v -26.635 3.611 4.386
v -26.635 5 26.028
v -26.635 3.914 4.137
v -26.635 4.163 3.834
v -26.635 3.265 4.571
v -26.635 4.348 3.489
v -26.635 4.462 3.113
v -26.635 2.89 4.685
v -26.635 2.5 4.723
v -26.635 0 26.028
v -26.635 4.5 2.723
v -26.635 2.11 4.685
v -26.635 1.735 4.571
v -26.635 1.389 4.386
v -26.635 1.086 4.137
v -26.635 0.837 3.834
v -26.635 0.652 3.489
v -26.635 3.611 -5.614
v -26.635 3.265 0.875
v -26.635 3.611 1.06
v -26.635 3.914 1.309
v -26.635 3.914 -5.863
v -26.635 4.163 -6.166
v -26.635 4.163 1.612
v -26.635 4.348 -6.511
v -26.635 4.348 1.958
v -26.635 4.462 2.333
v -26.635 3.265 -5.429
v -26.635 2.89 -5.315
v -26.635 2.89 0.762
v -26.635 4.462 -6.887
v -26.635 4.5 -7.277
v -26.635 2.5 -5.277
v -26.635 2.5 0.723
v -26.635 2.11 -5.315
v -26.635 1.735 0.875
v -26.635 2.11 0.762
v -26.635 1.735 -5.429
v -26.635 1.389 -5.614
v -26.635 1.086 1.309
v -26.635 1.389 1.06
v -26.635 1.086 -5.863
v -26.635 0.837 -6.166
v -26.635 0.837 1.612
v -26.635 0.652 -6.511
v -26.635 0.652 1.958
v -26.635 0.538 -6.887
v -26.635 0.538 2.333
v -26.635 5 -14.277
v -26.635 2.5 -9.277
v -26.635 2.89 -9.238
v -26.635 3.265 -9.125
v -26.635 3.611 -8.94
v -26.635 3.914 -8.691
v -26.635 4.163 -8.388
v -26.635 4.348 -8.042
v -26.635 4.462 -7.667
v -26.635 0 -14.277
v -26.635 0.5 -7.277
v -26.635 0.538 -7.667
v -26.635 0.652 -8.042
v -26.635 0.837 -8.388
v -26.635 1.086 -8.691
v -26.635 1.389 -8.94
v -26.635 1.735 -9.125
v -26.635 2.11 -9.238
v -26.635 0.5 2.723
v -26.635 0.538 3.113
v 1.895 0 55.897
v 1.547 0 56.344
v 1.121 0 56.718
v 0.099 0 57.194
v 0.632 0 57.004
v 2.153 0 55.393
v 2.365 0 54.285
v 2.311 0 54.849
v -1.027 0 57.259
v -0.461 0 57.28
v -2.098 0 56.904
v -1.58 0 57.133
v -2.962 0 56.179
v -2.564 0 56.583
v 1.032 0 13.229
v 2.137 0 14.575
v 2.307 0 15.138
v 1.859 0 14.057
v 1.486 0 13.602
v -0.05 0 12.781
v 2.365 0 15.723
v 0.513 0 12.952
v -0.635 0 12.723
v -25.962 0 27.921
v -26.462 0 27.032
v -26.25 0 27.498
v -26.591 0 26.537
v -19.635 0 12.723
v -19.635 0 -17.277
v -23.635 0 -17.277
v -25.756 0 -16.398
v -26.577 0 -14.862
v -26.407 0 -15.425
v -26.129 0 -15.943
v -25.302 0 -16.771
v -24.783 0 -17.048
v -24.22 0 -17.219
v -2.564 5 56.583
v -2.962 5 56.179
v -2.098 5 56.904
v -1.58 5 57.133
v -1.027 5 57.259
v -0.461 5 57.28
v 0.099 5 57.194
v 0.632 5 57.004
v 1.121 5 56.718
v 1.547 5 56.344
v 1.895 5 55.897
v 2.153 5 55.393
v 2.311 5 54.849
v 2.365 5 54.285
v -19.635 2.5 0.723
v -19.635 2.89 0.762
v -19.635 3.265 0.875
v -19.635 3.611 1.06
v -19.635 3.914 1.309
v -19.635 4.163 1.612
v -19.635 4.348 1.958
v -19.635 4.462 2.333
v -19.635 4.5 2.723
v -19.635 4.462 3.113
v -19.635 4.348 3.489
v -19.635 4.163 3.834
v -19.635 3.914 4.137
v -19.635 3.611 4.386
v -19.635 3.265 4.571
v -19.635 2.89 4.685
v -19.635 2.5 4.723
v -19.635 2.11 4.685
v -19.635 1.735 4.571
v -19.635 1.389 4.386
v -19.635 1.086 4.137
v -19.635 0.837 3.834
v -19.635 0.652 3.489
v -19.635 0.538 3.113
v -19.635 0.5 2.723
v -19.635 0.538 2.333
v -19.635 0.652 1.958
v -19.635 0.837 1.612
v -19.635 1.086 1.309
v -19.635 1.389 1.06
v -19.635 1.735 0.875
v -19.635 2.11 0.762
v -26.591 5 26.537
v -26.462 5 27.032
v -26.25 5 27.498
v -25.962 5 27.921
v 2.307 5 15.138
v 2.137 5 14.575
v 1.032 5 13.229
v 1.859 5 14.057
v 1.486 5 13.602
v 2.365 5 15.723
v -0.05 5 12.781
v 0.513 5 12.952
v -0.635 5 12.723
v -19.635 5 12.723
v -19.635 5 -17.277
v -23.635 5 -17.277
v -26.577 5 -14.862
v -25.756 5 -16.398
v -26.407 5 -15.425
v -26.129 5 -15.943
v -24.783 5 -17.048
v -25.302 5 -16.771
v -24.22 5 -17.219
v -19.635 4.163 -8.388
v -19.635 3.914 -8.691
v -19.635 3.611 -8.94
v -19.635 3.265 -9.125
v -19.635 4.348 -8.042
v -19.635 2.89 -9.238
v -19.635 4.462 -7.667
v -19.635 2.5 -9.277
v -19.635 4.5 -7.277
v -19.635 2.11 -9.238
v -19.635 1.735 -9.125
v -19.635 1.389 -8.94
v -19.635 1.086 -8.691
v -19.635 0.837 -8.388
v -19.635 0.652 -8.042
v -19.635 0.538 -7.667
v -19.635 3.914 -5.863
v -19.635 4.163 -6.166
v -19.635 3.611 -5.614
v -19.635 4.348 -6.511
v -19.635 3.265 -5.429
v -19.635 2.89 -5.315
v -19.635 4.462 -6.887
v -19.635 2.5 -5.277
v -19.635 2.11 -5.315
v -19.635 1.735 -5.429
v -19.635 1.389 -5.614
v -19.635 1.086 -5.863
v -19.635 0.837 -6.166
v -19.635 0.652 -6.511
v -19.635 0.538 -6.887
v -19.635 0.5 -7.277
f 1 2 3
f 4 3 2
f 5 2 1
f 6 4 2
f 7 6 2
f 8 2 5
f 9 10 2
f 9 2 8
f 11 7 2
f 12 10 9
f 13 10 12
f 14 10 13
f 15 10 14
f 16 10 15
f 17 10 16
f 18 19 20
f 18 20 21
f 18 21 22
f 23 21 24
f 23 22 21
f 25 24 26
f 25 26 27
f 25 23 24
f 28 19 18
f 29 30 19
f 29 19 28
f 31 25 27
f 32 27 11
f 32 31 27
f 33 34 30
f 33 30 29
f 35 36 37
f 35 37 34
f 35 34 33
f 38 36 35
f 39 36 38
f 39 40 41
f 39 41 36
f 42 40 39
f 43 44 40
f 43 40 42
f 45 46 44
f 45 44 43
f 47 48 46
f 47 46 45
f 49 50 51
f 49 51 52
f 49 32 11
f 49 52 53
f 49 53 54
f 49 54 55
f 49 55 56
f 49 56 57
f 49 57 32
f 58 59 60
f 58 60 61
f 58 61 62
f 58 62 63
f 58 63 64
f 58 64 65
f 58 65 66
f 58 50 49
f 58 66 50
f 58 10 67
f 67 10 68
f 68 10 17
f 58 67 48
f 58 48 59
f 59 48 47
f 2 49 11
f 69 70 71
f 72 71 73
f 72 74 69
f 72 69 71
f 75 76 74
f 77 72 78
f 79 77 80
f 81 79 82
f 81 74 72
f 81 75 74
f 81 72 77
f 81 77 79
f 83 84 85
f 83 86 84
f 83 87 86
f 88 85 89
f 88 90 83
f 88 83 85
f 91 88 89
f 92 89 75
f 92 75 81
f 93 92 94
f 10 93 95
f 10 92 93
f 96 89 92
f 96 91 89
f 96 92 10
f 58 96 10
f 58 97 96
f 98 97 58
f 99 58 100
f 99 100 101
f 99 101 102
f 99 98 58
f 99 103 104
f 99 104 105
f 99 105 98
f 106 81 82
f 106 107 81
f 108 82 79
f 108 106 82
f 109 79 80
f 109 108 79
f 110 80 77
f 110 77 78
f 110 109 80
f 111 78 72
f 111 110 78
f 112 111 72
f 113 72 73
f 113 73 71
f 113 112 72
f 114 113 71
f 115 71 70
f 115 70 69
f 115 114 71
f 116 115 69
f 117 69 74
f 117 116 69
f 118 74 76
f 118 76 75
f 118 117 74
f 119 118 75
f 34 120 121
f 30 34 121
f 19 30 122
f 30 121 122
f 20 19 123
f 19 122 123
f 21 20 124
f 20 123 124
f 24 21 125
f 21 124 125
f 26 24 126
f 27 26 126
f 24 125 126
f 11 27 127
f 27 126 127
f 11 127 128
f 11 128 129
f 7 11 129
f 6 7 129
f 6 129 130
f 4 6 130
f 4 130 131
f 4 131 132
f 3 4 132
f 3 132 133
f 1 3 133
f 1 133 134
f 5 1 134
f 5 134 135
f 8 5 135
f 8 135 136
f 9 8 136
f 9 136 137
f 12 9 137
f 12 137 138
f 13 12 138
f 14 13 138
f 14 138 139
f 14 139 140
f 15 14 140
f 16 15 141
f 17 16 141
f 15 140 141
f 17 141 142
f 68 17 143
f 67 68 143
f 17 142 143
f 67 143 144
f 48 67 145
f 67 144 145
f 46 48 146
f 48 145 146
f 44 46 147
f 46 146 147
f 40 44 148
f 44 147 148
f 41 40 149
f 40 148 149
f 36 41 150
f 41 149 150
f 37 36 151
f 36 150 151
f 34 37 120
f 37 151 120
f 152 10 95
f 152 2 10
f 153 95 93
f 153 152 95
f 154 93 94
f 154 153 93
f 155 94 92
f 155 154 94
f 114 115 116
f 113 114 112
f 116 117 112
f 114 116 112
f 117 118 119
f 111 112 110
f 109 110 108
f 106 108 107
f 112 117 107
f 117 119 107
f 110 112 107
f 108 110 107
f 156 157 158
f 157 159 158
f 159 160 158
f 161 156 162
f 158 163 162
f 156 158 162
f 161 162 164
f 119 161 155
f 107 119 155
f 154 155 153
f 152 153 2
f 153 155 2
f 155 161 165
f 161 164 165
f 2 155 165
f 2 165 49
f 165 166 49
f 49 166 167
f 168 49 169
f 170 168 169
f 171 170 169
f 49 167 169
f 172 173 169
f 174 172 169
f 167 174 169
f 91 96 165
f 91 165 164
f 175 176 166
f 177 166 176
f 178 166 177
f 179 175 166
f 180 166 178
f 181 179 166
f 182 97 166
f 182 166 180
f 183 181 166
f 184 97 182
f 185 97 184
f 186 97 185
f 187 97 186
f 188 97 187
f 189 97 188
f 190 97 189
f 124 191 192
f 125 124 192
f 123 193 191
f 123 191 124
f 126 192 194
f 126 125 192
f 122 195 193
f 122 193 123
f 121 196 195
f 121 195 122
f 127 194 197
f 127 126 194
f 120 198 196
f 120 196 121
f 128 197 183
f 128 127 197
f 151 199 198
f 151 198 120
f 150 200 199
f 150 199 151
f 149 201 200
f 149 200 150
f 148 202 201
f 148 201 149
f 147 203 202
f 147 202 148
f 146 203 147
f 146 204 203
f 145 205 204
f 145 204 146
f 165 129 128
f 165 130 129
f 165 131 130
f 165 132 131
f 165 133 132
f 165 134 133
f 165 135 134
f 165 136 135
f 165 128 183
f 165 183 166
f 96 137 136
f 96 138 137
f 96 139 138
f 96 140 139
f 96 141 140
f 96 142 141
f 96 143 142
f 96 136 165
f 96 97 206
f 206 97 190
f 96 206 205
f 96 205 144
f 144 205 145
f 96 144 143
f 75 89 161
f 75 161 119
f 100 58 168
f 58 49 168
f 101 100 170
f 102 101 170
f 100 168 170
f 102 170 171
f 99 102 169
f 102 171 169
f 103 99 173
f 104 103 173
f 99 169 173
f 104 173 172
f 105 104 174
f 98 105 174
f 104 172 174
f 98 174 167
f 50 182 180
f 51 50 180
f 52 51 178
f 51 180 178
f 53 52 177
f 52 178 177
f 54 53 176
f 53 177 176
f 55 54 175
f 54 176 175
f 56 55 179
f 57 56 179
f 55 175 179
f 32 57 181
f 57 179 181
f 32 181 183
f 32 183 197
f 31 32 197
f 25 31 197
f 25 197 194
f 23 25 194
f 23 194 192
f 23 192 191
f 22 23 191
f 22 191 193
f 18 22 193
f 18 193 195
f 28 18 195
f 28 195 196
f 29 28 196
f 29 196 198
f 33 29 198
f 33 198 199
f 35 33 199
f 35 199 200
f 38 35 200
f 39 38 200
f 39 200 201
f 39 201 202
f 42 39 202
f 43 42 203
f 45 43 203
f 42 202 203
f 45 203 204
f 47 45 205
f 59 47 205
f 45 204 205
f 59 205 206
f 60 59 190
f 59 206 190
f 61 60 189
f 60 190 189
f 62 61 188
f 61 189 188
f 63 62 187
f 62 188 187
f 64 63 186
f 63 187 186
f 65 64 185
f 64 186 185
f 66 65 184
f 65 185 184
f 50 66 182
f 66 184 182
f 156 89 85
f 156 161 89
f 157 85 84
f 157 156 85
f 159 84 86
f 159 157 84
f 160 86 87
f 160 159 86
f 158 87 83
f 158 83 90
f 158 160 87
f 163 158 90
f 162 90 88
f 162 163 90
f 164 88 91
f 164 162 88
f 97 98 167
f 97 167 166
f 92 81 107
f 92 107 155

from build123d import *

# Parameters (mm, degrees)
BOSS_EXTRUDE1_DEPTH = 5
SKETCH3_R           = 2
CUT_EXTRUDE2_DEPTH  = 20
FILLET2_R           = 3
FILLET3_R           = 3
FILLET4_R           = 3


with BuildPart() as part:
    # Sketch1 → Boss-Extrude1 (new body)
    with BuildSketch(Plane(origin=(0, 0, 0), x_dir=(1, 0, 0), z_dir=(0, 1, 0))):
        Polygon((2.364942178, -62.723244455), (-26.635057822, -27.094088406), (-26.635057822, 17.276755545), (-19.635057822, 17.276755545), (-19.635057822, -12.723244455), (2.364942178, -12.723244455), align=None)
    extrude(amount=BOSS_EXTRUDE1_DEPTH)

    # Sketch3 → Cut-Extrude2 (cut)
    with BuildSketch(Plane(origin=(-19.635057822, 0, 0), x_dir=(0, 0, -1), z_dir=(1, 0, 0))):
        with Locations((-2.723244455, 2.5)):
            Circle(SKETCH3_R)
        with Locations((7.276755545, 2.5)):
            Circle(SKETCH3_R)
    extrude(amount=-CUT_EXTRUDE2_DEPTH, mode=Mode.SUBTRACT)

    # Fillet2
    fillet2_edges = [part.edges().sort_by_distance(p)[0] for p in [
        (2.364942178, 2.5, 62.723244455),
    ]]
    fillet(fillet2_edges, radius=FILLET2_R)

    # Fillet3
    fillet3_edges = [part.edges().sort_by_distance(p)[0] for p in [
        (2.364942178, 2.5, 12.723244455),
        (-26.635057822, 2.5, -17.276755545),
    ]]
    fillet(fillet3_edges, radius=FILLET3_R)

    # Fillet4
    fillet4_edges = [part.edges().sort_by_distance(p)[0] for p in [
        (-26.635057822, 2.5, 27.094088406),
    ]]
    fillet(fillet4_edges, radius=FILLET4_R)


solid = part.part
